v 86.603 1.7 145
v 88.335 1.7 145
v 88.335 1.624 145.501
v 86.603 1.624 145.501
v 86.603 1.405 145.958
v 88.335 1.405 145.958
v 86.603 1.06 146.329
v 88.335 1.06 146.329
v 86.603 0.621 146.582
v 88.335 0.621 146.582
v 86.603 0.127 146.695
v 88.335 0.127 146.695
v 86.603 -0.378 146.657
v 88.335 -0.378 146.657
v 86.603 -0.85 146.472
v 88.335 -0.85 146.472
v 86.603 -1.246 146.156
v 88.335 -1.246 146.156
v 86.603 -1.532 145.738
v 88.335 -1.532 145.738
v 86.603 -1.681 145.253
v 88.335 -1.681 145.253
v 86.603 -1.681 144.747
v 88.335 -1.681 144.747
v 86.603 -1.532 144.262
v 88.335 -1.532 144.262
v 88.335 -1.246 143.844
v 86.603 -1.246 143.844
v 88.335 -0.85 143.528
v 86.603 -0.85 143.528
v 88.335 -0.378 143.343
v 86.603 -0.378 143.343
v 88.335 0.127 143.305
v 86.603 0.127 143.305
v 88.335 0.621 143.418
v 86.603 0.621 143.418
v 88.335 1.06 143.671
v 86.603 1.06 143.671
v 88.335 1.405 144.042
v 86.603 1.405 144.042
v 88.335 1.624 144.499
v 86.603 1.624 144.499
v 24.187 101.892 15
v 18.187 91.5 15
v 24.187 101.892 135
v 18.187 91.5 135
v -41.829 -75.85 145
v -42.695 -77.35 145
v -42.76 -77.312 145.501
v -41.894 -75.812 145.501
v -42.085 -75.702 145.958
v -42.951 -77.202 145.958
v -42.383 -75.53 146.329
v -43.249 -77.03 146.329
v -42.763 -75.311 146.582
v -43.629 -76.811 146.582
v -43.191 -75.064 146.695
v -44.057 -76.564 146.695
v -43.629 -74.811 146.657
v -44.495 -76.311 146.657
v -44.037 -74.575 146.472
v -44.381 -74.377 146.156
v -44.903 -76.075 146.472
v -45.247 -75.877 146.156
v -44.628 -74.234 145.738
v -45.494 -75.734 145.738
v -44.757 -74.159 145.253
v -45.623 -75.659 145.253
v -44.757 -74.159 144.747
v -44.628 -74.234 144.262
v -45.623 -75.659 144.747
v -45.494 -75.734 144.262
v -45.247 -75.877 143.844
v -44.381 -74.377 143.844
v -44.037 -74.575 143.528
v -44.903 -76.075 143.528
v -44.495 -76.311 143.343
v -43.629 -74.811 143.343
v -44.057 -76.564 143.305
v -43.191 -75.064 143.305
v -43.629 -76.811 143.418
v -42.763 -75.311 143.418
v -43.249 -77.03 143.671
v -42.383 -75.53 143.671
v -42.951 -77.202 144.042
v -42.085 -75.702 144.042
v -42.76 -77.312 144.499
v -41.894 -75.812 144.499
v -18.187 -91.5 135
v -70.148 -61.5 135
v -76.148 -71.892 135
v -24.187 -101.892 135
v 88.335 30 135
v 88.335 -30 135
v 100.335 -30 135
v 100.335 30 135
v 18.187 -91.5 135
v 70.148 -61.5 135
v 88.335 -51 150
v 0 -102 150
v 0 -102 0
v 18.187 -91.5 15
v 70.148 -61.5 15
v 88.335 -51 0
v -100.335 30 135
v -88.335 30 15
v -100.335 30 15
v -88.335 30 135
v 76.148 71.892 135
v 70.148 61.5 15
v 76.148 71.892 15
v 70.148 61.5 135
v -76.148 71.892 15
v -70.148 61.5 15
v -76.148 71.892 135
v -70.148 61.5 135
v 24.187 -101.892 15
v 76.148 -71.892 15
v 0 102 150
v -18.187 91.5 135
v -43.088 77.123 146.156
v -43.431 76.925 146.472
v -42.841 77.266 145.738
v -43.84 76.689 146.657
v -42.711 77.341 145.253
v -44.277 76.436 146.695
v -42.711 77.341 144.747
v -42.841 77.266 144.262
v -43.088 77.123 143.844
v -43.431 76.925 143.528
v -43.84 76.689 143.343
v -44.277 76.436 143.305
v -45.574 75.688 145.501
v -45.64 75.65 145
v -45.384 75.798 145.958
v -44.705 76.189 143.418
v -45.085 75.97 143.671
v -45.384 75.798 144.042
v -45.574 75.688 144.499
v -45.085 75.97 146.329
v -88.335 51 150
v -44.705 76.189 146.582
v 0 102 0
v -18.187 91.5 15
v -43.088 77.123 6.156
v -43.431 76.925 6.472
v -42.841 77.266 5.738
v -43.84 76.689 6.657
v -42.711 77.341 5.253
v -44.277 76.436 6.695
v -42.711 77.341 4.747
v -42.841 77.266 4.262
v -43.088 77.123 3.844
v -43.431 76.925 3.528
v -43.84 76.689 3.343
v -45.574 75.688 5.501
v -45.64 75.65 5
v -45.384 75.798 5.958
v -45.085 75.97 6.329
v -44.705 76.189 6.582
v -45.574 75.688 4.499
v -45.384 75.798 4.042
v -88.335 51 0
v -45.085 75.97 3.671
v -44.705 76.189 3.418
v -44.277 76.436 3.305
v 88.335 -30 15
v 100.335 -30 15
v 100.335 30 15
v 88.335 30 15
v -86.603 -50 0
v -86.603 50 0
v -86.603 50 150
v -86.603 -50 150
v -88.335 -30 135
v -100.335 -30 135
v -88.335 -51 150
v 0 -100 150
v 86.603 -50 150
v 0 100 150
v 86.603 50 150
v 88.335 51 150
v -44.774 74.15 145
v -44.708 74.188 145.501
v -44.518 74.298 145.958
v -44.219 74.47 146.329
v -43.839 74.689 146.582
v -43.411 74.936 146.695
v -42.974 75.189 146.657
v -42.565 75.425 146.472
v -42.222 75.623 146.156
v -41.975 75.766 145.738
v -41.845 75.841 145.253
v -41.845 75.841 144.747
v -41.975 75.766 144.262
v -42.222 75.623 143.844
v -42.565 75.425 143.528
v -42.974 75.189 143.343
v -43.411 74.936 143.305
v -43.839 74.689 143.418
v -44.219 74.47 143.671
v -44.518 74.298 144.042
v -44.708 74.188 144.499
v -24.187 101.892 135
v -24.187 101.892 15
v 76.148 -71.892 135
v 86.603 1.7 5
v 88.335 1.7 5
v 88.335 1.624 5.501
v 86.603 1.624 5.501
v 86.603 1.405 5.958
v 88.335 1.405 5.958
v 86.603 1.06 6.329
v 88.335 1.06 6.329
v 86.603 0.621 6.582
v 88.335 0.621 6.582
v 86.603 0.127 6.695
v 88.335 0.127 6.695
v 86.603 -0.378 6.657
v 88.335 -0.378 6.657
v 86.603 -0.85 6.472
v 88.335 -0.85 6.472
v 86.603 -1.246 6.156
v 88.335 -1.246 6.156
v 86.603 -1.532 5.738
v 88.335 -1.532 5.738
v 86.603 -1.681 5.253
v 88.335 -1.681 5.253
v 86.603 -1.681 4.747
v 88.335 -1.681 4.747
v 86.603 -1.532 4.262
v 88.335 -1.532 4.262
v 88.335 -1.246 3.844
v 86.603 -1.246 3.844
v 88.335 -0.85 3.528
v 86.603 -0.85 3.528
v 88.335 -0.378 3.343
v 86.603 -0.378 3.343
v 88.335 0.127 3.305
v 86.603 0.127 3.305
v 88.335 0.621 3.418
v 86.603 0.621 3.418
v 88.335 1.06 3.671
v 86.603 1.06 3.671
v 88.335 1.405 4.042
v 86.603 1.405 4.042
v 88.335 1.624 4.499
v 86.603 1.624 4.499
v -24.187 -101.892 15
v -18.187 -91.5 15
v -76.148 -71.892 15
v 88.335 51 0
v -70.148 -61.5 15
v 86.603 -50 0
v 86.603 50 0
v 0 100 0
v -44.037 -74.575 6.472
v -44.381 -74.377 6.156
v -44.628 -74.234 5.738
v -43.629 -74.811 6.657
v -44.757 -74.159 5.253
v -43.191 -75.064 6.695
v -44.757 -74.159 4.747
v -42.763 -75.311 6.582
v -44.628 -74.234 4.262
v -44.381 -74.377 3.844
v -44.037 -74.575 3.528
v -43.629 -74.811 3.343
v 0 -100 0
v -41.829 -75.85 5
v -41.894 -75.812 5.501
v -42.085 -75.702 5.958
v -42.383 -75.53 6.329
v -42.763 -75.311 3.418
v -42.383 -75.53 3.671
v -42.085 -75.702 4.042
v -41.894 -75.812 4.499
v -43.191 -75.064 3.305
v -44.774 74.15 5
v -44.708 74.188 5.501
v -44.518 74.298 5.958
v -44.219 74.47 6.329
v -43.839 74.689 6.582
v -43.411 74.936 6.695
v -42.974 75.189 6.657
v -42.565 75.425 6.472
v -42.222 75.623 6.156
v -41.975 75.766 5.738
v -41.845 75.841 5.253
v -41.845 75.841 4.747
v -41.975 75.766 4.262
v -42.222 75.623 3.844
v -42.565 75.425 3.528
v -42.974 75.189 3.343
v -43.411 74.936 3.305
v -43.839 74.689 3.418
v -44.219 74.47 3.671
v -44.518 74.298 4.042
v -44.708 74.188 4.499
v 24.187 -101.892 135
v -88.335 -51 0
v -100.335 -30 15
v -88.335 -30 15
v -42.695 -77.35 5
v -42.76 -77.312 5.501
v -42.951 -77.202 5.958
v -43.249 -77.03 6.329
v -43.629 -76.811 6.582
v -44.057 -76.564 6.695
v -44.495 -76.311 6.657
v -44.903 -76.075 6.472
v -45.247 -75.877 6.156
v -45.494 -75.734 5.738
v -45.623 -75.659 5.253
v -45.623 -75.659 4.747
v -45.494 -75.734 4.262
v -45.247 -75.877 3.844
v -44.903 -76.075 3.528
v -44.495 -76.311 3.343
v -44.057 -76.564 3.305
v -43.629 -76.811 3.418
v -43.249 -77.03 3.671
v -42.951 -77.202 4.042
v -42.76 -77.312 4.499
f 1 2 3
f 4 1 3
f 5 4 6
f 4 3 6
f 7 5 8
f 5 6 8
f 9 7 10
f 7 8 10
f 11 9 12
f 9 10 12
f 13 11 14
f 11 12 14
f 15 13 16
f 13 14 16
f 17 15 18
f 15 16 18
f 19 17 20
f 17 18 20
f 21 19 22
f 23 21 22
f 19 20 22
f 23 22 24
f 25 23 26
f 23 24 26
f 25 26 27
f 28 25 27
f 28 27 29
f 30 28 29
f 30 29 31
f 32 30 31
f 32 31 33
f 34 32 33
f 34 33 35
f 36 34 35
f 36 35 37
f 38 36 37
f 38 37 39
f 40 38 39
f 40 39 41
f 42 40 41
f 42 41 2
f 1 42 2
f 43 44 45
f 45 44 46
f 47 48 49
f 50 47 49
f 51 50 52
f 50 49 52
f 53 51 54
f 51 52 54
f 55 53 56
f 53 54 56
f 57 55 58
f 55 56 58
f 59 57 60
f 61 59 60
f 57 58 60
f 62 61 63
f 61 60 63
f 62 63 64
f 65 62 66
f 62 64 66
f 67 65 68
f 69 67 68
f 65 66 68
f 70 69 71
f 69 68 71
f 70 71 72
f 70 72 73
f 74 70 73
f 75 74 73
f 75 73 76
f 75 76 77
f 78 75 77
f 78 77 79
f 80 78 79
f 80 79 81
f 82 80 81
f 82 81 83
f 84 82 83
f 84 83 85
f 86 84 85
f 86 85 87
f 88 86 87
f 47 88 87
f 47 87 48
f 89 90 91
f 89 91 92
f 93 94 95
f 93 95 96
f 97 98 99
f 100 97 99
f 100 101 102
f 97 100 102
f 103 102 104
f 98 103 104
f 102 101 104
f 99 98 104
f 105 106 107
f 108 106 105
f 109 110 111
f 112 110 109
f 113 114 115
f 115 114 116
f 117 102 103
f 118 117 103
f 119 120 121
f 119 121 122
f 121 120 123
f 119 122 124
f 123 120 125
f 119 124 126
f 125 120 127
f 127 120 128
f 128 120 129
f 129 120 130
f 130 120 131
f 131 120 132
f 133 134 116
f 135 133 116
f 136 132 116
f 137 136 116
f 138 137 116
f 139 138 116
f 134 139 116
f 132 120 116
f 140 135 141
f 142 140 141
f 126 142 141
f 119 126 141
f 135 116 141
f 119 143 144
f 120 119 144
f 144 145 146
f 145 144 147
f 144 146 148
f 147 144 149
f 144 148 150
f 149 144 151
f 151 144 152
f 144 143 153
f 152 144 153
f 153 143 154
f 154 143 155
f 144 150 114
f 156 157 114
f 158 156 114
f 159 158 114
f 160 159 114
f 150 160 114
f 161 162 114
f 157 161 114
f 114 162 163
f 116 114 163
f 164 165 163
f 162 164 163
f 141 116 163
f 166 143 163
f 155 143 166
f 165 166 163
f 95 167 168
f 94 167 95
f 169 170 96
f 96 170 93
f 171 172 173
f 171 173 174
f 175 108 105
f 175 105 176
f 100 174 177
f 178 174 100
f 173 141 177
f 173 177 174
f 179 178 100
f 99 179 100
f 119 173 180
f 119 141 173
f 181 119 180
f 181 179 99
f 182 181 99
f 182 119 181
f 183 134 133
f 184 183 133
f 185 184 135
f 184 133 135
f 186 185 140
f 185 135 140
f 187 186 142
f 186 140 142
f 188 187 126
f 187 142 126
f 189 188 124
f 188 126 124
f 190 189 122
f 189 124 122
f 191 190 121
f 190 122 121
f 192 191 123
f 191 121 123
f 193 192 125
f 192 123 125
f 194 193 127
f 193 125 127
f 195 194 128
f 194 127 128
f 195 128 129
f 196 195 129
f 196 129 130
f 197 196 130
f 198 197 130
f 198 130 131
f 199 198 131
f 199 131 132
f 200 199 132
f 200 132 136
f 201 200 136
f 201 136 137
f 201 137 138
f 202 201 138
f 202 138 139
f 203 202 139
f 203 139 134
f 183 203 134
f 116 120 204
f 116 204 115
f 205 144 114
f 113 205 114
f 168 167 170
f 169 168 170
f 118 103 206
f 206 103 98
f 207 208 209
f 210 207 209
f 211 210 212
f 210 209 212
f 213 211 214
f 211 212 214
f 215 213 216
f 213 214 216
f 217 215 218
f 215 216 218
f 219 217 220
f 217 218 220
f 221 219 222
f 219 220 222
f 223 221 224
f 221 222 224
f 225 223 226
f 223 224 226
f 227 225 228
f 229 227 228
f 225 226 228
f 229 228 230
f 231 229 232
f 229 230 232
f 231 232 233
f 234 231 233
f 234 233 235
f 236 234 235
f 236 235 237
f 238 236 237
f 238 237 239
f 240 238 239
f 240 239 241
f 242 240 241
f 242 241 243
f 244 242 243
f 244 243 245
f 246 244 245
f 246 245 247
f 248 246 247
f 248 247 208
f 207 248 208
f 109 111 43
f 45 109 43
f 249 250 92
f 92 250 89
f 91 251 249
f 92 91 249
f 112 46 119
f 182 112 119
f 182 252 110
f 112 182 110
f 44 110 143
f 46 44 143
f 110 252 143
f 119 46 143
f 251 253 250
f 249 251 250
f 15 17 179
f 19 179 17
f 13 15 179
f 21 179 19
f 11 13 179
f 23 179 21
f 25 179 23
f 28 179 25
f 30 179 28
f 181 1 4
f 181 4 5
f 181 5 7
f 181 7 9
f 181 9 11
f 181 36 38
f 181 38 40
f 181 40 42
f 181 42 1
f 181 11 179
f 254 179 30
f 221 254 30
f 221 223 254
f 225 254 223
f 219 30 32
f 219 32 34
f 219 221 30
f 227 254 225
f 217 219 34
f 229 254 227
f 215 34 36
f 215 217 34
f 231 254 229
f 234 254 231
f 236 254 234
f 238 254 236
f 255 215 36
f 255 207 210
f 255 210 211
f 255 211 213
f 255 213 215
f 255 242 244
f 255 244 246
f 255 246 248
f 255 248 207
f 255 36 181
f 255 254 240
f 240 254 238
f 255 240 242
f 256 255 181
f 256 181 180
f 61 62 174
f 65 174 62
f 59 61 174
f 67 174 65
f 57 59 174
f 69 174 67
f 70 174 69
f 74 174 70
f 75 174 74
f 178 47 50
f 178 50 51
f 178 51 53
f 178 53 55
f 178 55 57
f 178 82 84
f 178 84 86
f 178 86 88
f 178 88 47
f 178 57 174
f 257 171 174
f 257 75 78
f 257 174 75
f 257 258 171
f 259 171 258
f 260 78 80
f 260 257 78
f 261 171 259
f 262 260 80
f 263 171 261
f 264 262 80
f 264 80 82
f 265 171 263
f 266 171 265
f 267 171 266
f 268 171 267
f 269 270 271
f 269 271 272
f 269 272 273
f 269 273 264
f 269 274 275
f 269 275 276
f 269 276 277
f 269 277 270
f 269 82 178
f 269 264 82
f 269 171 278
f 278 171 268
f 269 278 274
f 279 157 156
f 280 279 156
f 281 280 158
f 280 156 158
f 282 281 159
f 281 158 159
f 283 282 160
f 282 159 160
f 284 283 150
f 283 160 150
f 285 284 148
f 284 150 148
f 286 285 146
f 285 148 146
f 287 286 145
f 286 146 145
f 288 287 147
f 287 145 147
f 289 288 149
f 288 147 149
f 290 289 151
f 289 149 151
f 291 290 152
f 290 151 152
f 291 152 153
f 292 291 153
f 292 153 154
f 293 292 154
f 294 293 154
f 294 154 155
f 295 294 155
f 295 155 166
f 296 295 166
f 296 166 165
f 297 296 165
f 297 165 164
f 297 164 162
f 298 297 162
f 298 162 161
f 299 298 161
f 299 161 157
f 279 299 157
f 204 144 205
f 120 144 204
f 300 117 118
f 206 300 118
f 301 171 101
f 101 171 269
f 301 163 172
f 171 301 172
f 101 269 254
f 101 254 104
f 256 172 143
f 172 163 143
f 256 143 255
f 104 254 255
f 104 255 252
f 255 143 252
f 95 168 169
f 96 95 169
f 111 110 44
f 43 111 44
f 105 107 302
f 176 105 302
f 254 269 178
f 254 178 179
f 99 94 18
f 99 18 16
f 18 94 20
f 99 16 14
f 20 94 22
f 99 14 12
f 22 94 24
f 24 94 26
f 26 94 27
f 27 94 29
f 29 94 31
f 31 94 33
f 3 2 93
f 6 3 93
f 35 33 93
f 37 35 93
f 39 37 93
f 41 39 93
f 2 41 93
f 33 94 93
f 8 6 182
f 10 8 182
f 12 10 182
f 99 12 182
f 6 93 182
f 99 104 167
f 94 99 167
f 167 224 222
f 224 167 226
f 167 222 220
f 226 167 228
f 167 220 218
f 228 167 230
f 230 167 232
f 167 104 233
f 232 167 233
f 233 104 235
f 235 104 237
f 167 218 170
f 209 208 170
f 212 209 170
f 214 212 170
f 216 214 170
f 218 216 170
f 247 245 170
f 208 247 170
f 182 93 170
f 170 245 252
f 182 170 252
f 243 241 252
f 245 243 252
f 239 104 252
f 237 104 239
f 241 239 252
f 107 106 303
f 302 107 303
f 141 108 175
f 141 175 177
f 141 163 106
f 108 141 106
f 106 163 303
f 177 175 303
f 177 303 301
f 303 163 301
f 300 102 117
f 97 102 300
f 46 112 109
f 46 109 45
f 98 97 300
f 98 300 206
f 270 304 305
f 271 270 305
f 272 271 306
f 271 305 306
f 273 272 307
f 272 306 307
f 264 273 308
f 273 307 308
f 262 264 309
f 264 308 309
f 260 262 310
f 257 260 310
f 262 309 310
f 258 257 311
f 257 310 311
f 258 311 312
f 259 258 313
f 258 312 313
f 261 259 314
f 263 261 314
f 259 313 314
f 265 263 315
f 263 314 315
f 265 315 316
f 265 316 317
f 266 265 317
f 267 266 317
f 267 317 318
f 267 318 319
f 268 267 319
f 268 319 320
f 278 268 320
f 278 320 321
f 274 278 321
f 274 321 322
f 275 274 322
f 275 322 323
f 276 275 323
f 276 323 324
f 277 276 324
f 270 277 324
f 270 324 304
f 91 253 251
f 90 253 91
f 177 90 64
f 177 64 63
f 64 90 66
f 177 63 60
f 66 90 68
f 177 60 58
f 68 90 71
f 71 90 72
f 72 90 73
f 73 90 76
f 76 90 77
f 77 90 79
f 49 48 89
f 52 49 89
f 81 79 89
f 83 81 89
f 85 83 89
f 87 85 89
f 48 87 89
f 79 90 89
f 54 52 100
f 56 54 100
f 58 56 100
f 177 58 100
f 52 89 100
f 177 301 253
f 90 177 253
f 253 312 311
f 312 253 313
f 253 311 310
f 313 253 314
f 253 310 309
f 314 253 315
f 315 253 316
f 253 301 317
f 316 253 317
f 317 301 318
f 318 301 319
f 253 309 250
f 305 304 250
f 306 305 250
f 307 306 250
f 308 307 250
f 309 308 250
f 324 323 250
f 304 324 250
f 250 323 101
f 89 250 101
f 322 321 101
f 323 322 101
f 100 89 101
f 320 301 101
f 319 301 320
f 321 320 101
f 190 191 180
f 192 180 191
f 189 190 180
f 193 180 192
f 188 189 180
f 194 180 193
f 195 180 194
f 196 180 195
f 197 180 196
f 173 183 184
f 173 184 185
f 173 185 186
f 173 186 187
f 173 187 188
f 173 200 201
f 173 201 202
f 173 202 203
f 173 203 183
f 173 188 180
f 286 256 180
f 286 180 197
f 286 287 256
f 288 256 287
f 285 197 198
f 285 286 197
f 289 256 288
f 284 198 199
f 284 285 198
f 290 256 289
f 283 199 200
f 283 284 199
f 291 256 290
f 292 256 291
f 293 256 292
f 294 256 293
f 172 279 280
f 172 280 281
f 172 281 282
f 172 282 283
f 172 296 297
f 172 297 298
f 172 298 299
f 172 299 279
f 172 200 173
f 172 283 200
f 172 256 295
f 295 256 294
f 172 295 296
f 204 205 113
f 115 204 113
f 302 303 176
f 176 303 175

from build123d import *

# Parameters (mm, degrees)
PAD_DEPTH      = 150
SKETCH_R       = 1.7
HOLE_DEPTH     = 25
HOLE_TIPS_R    = 1.7
SKETCH008_R    = 1.7
HOLE001_DEPTH  = 25
HOLE001_TIPS_R = 1.7
SKETCH009_R    = 1.7
HOLE002_DEPTH  = 25
HOLE002_TIPS_R = 1.7
SKETCH010_W    = 60
SKETCH010_H    = 120
PAD001_DEPTH   = 12
SKETCH012_W    = 60
SKETCH012_H    = 120
PAD002_DEPTH   = 12
SKETCH013_W    = 60
SKETCH013_H    = 120
PAD003_DEPTH   = 12
SKETCH015_W    = 60
SKETCH015_H    = 120
PAD004_DEPTH   = 12
SKETCH016_W    = 60
SKETCH016_H    = 120
PAD005_DEPTH   = 12
SKETCH017_W    = 60
SKETCH017_H    = 120
PAD006_DEPTH   = 12


with BuildPart() as part:
    # Sketch007 → Pad (new body)
    with BuildSketch(Plane.XY):
        Polygon((88.334591186, 51), (0, 102), (-88.334591186, 51), (-88.334591186, -51), (0, -102), (88.334591186, -51), align=None)
        Polygon((86.6025403784, 50), (0, 100), (-86.6025403784, 50), (-86.6025403784, -50), (0, -100), (86.6025403784, -50), align=None, mode=Mode.SUBTRACT)
    extrude(amount=PAD_DEPTH)

    # Sketch (on Face6 of Pad) → Hole (cut)
    with BuildSketch(Plane.YZ.offset(88.334591186)):
        with Locations((0, 5)):
            Circle(SKETCH_R)
        with Locations((0, 145)):
            Circle(SKETCH_R)
    extrude(amount=-HOLE_DEPTH, mode=Mode.SUBTRACT)

    # Hole tips → Hole tip 1 section 0
    with BuildSketch(Plane.YZ.offset(63.334591186), mode=Mode.PRIVATE) as hole_tip_1_s0:
        with Locations((0, 5)):
            Circle(HOLE_TIPS_R)
    loft([hole_tip_1_s0.sketch, Vertex(62.3131281337, 0, 5)], mode=Mode.SUBTRACT)

    # Hole tips → Hole tip 2 section 0
    with BuildSketch(Plane.YZ.offset(63.334591186), mode=Mode.PRIVATE) as hole_tip_2_s0:
        with Locations((0, 145)):
            Circle(HOLE_TIPS_R)
    loft([hole_tip_2_s0.sketch, Vertex(62.3131281337, 0, 145)], mode=Mode.SUBTRACT)

    # Sketch008 (on Face3 of Hole) → Hole001 (cut)
    with BuildSketch(Plane(origin=(-44.167295593, 76.5, 0), x_dir=(-0.8660254038, -0.5, 0), z_dir=(-0.5, 0.8660254038, 0))):
        with Locations((0, 5)):
            Circle(SKETCH008_R)
        with Locations((0, 145)):
            Circle(SKETCH008_R)
    extrude(amount=-HOLE001_DEPTH, mode=Mode.SUBTRACT)

    # Hole001 tips → Hole001 tip 1 section 0
    with BuildSketch(Plane(origin=(-31.667295593, 54.8493649054, 0), x_dir=(-0.8660254038, -0.5, 0), z_dir=(-0.5, 0.8660254038, 0)), mode=Mode.PRIVATE) as hole001_tip_1_s0:
        with Locations((0, 5)):
            Circle(HOLE001_TIPS_R)
    loft([hole001_tip_1_s0.sketch, Vertex(-31.1565640668, 53.964751953, 5)], mode=Mode.SUBTRACT)

    # Hole001 tips → Hole001 tip 2 section 0
    with BuildSketch(Plane(origin=(-31.667295593, 54.8493649054, 0), x_dir=(-0.8660254038, -0.5, 0), z_dir=(-0.5, 0.8660254038, 0)), mode=Mode.PRIVATE) as hole001_tip_2_s0:
        with Locations((0, 145)):
            Circle(HOLE001_TIPS_R)
    loft([hole001_tip_2_s0.sketch, Vertex(-31.1565640668, 53.964751953, 145)], mode=Mode.SUBTRACT)

    # Sketch009 (on Face10 of Hole) → Hole002 (cut)
    with BuildSketch(Plane(origin=(-44.167295593, -76.5, 0), x_dir=(0.8660254038, -0.5, 0), z_dir=(-0.5, -0.8660254038, 0))):
        with Locations((0, 5)):
            Circle(SKETCH009_R)
        with Locations((0, 145)):
            Circle(SKETCH009_R)
    extrude(amount=-HOLE002_DEPTH, mode=Mode.SUBTRACT)

    # Hole002 tips → Hole002 tip 1 section 0
    with BuildSketch(Plane(origin=(-31.667295593, -54.8493649054, 0), x_dir=(0.8660254038, -0.5, 0), z_dir=(-0.5, -0.8660254038, 0)), mode=Mode.PRIVATE) as hole002_tip_1_s0:
        with Locations((0, 5)):
            Circle(HOLE002_TIPS_R)
    loft([hole002_tip_1_s0.sketch, Vertex(-31.1565640668, -53.964751953, 5)], mode=Mode.SUBTRACT)

    # Hole002 tips → Hole002 tip 2 section 0
    with BuildSketch(Plane(origin=(-31.667295593, -54.8493649054, 0), x_dir=(0.8660254038, -0.5, 0), z_dir=(-0.5, -0.8660254038, 0)), mode=Mode.PRIVATE) as hole002_tip_2_s0:
        with Locations((0, 145)):
            Circle(HOLE002_TIPS_R)
    loft([hole002_tip_2_s0.sketch, Vertex(-31.1565640668, -53.964751953, 145)], mode=Mode.SUBTRACT)

    # Sketch010 (on Face12 of Hole002) → Pad001 (join)
    with BuildSketch(Plane(origin=(-44.167295593, -76.5, 0), x_dir=(0.8660254038, -0.5, 0), z_dir=(-0.5, -0.8660254038, 0))):
        with Locations((0, 75)):
            Rectangle(SKETCH010_W, SKETCH010_H)
    extrude(amount=PAD001_DEPTH)

    # Sketch012 (on Face6 of Hole002) → Pad002 (join)
    with BuildSketch(Plane(origin=(44.167295593, -76.5, 0), x_dir=(0.8660254038, 0.5, 0), z_dir=(0.5, -0.8660254038, 0))):
        with Locations((0, 75)):
            Rectangle(SKETCH012_W, SKETCH012_H)
    extrude(amount=PAD002_DEPTH)

    # Sketch013 (on Face2 of Hole002) → Pad003 (join)
    with BuildSketch(Plane.YZ.offset(88.334591186)):
        with Locations((0, 75)):
            Rectangle(SKETCH013_W, SKETCH013_H)
    extrude(amount=PAD003_DEPTH)

    # Sketch015 (on Face1 of Hole002) → Pad004 (join)
    with BuildSketch(Plane(origin=(44.167295593, 76.5, 0), x_dir=(-0.8660254038, 0.5, 0), z_dir=(0.5, 0.8660254038, 0))):
        with Locations((0, 75)):
            Rectangle(SKETCH015_W, SKETCH015_H)
    extrude(amount=PAD004_DEPTH)

    # Sketch016 (on Face3 of Hole002) → Pad005 (join)
    with BuildSketch(Plane(origin=(-44.167295593, 76.5, 0), x_dir=(-0.8660254038, -0.5, 0), z_dir=(-0.5, 0.8660254038, 0))):
        with Locations((0, 75)):
            Rectangle(SKETCH016_W, SKETCH016_H)
    extrude(amount=PAD005_DEPTH)

    # Sketch017 (on Face9 of Hole002) → Pad006 (join)
    with BuildSketch(Plane(origin=(-88.334591186, 0, 0), x_dir=(0, -1, 0), z_dir=(-1, 0, 0))):
        with Locations((0, 75)):
            Rectangle(SKETCH017_W, SKETCH017_H)
    extrude(amount=PAD006_DEPTH)


solid = part.part
